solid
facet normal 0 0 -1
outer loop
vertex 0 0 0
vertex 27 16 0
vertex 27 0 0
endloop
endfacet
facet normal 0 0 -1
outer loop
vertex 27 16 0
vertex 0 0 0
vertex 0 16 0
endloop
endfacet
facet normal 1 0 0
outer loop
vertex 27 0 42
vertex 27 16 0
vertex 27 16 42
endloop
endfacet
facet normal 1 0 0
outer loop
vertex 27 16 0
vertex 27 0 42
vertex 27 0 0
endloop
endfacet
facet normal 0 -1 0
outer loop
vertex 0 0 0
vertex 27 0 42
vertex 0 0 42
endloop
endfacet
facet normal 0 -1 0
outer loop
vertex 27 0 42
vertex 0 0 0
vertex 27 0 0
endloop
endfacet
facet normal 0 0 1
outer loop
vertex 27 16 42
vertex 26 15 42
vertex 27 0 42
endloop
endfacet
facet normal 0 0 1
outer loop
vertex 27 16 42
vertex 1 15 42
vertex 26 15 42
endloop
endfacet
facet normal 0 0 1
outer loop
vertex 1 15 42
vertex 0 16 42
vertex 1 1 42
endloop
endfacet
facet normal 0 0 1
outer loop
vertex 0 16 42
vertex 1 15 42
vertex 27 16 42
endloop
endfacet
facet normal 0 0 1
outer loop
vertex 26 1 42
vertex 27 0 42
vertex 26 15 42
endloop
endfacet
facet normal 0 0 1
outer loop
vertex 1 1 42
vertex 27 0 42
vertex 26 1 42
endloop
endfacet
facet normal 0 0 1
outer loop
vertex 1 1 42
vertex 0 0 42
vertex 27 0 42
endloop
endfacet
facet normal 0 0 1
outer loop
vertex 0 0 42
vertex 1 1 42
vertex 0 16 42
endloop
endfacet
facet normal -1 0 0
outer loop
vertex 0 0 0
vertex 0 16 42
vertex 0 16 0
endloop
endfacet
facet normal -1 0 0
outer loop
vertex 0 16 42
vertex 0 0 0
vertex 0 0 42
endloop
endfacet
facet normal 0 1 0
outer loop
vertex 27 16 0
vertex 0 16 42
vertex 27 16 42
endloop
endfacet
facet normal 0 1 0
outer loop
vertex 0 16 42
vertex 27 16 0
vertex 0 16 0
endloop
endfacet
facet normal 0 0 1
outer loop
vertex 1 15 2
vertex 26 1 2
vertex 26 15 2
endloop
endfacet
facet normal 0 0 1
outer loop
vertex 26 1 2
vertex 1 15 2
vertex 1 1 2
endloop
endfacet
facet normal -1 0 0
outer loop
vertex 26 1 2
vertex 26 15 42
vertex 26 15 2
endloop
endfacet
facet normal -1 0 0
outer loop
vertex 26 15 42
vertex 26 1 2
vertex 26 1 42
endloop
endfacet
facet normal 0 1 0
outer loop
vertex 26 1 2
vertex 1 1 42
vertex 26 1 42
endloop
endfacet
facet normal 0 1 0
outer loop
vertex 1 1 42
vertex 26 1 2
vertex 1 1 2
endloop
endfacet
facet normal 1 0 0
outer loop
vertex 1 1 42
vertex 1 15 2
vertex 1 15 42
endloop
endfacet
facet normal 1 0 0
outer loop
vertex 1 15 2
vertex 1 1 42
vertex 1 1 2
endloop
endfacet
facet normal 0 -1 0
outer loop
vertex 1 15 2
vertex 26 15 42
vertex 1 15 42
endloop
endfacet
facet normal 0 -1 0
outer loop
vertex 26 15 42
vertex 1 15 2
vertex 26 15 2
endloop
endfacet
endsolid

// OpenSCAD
width = 14;
thickness =25;
border = 2;
height = 40;
bottom = 2;

difference() {
	linear_extrude(height=bottom+height) {
		polygon([[0,0],[0,width+border],[thickness+border,width+border],[thickness+border,0]]);
	}

	translate([border/2,border/2,bottom]) {
		linear_extrude(height=height+1) {
			polygon([[0,0],[0,width],[thickness,width],[thickness,0]]);
		}
	}
}
